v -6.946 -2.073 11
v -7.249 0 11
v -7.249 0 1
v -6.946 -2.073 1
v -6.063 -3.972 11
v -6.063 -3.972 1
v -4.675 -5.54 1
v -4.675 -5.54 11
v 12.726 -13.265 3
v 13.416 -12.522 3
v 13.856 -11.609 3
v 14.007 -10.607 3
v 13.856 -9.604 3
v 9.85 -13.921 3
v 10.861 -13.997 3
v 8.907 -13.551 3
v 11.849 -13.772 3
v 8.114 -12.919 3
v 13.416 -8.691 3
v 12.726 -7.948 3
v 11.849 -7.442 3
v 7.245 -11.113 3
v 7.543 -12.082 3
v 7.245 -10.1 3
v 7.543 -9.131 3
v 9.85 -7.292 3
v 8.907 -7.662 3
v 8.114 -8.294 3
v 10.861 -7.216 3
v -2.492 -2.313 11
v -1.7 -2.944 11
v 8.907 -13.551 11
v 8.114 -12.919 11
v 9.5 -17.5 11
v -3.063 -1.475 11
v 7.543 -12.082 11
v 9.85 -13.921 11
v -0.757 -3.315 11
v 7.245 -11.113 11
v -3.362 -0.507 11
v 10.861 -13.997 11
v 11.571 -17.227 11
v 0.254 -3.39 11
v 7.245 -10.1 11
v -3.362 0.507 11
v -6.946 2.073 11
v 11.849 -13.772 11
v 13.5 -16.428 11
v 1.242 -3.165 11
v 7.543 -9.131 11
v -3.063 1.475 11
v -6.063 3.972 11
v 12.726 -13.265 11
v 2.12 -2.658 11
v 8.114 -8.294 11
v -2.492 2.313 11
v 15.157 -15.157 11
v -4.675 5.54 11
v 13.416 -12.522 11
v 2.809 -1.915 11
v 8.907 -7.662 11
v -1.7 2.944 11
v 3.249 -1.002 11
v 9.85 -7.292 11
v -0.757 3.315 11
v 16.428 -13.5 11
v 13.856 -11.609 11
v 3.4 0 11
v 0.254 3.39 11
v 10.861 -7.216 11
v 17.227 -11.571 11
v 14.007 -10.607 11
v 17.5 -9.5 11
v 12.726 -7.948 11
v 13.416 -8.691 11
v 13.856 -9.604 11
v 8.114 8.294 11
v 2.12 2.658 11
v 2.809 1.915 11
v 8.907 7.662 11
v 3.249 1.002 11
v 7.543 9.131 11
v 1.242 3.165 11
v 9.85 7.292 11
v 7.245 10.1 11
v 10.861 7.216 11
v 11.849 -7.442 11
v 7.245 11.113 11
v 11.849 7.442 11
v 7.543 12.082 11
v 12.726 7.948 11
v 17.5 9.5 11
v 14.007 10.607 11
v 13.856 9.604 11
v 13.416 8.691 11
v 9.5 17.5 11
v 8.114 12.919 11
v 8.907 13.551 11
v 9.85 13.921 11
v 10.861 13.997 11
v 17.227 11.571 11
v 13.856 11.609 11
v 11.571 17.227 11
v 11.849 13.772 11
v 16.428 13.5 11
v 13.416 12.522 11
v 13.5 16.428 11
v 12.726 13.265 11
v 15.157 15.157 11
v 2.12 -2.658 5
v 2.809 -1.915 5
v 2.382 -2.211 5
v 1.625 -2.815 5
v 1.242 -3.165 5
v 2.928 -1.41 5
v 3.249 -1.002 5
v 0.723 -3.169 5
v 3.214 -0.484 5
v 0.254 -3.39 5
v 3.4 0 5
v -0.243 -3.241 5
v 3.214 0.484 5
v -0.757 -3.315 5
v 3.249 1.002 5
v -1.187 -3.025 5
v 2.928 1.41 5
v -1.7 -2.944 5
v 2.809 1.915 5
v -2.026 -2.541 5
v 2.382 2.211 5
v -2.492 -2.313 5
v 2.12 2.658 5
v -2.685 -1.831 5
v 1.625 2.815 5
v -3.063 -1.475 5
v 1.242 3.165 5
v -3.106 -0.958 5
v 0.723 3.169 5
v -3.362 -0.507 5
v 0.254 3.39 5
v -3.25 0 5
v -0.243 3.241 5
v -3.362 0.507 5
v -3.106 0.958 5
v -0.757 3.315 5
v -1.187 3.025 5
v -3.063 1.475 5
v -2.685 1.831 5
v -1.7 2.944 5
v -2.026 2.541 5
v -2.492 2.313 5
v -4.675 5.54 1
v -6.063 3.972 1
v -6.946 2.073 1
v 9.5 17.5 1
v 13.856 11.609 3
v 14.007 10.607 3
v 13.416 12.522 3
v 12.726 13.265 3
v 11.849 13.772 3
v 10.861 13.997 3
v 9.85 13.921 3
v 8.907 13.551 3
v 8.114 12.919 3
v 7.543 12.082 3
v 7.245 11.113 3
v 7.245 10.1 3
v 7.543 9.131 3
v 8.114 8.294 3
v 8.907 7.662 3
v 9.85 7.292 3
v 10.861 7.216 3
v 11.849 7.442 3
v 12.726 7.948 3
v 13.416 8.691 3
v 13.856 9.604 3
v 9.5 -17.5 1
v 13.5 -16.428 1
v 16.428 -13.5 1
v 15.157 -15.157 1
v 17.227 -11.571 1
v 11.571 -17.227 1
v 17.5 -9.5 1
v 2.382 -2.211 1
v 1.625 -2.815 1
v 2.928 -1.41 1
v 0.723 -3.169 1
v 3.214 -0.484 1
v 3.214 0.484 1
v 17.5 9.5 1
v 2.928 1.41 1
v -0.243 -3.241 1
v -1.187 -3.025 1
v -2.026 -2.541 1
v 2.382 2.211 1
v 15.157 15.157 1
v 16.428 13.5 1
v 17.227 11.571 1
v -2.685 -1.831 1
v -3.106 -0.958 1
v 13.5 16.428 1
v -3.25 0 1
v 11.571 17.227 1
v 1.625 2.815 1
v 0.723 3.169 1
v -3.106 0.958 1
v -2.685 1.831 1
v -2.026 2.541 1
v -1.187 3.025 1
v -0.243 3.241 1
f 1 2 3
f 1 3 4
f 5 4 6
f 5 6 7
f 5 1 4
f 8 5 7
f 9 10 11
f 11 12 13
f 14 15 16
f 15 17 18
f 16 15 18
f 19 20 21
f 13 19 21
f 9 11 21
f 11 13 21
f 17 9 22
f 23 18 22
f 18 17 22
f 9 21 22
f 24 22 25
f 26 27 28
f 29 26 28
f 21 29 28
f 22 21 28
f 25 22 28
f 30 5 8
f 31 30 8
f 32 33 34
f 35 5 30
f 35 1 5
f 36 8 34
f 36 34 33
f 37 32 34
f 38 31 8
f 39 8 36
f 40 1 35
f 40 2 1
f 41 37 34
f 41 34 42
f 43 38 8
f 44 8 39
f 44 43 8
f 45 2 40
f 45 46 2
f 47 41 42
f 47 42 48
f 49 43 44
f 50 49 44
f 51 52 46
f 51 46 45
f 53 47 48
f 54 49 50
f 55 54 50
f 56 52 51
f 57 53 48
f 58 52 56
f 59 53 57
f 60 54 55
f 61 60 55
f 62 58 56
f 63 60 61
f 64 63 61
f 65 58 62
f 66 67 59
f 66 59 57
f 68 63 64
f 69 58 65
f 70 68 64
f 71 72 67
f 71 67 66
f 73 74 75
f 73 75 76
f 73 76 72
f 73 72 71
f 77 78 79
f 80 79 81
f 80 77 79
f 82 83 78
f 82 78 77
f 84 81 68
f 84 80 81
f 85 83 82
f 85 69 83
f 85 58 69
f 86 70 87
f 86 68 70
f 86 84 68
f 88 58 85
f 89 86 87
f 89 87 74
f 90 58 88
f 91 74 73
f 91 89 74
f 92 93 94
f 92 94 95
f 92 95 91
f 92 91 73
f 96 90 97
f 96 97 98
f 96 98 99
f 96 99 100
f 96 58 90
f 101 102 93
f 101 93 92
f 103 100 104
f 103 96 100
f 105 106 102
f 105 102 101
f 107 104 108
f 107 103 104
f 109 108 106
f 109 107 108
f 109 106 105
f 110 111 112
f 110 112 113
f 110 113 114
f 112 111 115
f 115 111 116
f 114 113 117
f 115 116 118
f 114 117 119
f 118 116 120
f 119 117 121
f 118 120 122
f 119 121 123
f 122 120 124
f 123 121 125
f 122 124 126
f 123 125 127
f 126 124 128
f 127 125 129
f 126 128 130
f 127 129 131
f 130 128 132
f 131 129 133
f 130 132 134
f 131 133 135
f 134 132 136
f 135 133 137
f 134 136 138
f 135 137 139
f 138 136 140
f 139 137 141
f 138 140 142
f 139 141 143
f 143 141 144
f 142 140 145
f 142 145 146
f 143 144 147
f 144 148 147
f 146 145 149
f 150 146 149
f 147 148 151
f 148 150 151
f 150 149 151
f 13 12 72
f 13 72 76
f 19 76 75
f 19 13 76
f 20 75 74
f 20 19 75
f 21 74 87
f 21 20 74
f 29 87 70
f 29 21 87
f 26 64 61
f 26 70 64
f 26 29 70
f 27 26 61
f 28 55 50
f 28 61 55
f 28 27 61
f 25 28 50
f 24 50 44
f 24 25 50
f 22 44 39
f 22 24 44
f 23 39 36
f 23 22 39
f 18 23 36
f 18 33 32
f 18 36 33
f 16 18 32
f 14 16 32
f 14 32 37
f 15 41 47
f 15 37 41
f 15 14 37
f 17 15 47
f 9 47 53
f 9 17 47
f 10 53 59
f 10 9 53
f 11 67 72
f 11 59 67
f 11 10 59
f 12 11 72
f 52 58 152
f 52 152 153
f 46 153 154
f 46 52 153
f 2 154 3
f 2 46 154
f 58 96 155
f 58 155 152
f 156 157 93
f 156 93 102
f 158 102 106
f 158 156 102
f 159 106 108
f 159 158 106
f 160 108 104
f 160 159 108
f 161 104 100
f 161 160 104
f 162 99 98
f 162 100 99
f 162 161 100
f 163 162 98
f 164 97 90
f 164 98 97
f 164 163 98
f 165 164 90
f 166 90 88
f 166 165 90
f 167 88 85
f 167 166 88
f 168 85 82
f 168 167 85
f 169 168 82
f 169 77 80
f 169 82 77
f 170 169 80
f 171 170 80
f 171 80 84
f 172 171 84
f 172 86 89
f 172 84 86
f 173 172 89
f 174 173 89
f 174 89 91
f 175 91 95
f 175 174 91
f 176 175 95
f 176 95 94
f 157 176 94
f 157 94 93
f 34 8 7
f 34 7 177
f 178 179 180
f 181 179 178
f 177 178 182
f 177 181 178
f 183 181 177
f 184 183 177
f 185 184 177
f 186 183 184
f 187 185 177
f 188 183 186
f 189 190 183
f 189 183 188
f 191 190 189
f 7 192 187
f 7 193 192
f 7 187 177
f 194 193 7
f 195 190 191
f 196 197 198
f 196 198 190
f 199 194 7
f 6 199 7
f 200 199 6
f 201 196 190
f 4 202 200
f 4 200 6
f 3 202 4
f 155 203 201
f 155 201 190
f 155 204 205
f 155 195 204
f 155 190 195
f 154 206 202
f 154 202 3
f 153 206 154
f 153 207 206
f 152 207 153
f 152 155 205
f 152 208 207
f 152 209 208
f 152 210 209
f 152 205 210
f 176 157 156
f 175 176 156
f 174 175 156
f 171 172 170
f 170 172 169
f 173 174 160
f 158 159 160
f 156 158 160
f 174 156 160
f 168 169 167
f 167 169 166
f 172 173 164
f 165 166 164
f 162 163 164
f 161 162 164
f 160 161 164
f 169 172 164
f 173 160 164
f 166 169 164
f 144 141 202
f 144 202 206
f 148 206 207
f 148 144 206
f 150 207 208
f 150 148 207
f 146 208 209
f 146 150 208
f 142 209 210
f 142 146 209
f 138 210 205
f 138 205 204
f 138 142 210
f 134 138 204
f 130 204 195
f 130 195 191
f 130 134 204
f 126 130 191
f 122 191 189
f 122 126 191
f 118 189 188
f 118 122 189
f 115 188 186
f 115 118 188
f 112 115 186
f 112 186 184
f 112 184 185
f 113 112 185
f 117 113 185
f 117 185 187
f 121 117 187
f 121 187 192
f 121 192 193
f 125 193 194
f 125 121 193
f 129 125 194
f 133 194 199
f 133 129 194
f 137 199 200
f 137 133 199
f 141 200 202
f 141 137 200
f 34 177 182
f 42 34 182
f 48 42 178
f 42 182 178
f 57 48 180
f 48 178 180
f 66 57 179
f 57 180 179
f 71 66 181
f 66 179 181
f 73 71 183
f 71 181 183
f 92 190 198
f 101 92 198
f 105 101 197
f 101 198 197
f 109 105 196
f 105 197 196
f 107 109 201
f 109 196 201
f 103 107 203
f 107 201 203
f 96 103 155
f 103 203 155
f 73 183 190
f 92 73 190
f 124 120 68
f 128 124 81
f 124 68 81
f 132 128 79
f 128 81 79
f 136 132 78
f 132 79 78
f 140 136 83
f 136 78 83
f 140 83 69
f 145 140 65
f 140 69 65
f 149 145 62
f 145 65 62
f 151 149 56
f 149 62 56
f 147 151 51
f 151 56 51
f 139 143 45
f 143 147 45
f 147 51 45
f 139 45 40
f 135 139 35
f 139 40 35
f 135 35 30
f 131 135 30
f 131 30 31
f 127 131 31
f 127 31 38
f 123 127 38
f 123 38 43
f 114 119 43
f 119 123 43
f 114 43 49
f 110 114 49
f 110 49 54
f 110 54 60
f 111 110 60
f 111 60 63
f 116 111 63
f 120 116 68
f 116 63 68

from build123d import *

# Parameters (mm, degrees)
SKETCH_1_R          = 3.4
EXTRUDE_1_DEPTH     = 11
SKETCH_2_R          = 3.4
EXTRUDE_2_DEPTH     = 3
SKETCH_3_R          = 3.4
CUT_EXTRUDE_1_DEPTH = 28.083205128
CUT_EXTRUDE_START   = -5
SKETCH_4_R          = 6
SKETCH_4_R_2        = 3.4
CUT_EXTRUDE_2_DEPTH = 5
CUT_EXTRUDE_3_DEPTH = 28.083205128
CUT_EXTRUDE_5_DEPTH = 28.083205128
SKETCH_8_R          = 3.4
EXTRUDE_3_DEPTH     = 1
CUT_EXTRUDE_START_2 = -1
CUT_EXTRUDE_6_DEPTH = 1
CUT_EXTRUDE_7_DEPTH = 1
CUT_EXTRUDE_START_3 = -10
CUT_EXTRUDE_8_DEPTH = 10
EXTRUDE_START       = -4
SKETCH_12_R         = 6
SKETCH_12_R_2       = 3.25
EXTRUDE_5_DEPTH     = 4


with BuildPart() as part:
    # 草图1 → 凸台-拉伸1 (new body)
    with BuildSketch(Plane.XY):
        with BuildLine():
            Line((-9.5, -17.5), (9.5, -17.5))
            ThreePointArc((9.5, -17.5), (15.156854249, -15.156854249), (17.5, -9.5))
            Line((17.5, -9.5), (17.5, 9.5))
            ThreePointArc((17.5, 9.5), (15.156854249, 15.156854249), (9.5, 17.5))
            Line((9.5, 17.5), (-9.5, 17.5))
            ThreePointArc((-9.5, 17.5), (-15.156854249, 15.156854249), (-17.5, 9.5))
            Line((-17.5, 9.5), (-17.5, -9.5))
            ThreePointArc((-17.5, -9.5), (-15.156854249, -15.156854249), (-9.5, -17.5))
        make_face()
        with Locations((10.606601718, 10.606601718)):
            Circle(SKETCH_1_R, mode=Mode.SUBTRACT)
        with Locations((10.606601718, -10.606601718)):
            Circle(SKETCH_1_R, mode=Mode.SUBTRACT)
        with Locations((-10.606601718, -10.606601718)):
            Circle(SKETCH_1_R, mode=Mode.SUBTRACT)
        with Locations((-10.606601718, 10.606601718)):
            Circle(SKETCH_1_R, mode=Mode.SUBTRACT)
    extrude(amount=EXTRUDE_1_DEPTH)

    # 草图2 → 凸台-拉伸2 (add)
    with BuildSketch(Plane(origin=(0, 0, 0), x_dir=(-1, 0, 0), z_dir=(0, 0, -1))):
        with Locations((10.606601718, -10.606601718)):
            Circle(SKETCH_2_R)
        with Locations((-10.606601718, -10.606601718)):
            Circle(SKETCH_2_R)
        with Locations((10.606601718, 10.606601718)):
            Circle(SKETCH_2_R)
        with Locations((-10.606601718, 10.606601718)):
            Circle(SKETCH_2_R)
    extrude(amount=-EXTRUDE_2_DEPTH)

    # 草图3 → 切除-拉伸1 (cut, through all)
    with BuildSketch(Plane.XY.offset(11)):
        Circle(SKETCH_3_R)
    extrude(amount=-CUT_EXTRUDE_1_DEPTH, mode=Mode.SUBTRACT)

    # 草图4 → 切除-拉伸2 (cut)
    with BuildSketch(Plane(origin=(0, 0, 0), x_dir=(-1, 0, 0), z_dir=(0, 0, -1)).offset(CUT_EXTRUDE_START)):
        Circle(SKETCH_4_R)
        with Locations(Location((0, 0, 0), (0, 0, 180))):
            Circle(SKETCH_4_R_2, mode=Mode.SUBTRACT)
    extrude(amount=CUT_EXTRUDE_2_DEPTH, mode=Mode.SUBTRACT)

    # 草图6 → 切除-拉伸3 (cut, through all)
    with BuildSketch(Plane(origin=(0, 0, 0), x_dir=(-1, 0, 0), z_dir=(0, 0, -1))):
        with BuildLine():
            Line((9.5, 17.5), (0, 17.5))
            Line((0, 17.5), (17.5, 0))
            Line((17.5, 0), (17.5, 9.5))
            ThreePointArc((17.5, 9.5), (15.156854249, 15.156854249), (9.5, 17.5))
        make_face()
        with BuildLine():
            Line((17.5, -9.5), (17.5, 0))
            Line((17.5, 0), (0, -17.5))
            Line((0, -17.5), (9.5, -17.5))
            ThreePointArc((9.5, -17.5), (15.156854249, -15.156854249), (17.5, -9.5))
        make_face()
    extrude(amount=-CUT_EXTRUDE_3_DEPTH, mode=Mode.SUBTRACT)

    # 草图7 → 切除-拉伸5 (cut, through all)
    with BuildSketch(Plane.XY.offset(11)):
        with BuildLine():
            Line((-7.222574041, -10.277425959), (0, -17.5))
            ThreePointArc((0, -17.5), (-7.248737342, 0), (0, 17.5))
            Line((0, 17.5), (-7.222574041, 10.277425959))
            ThreePointArc((-7.222574041, 10.277425959), (-8.202438662, 8.202438662), (-10.277425959, 7.222574041))
            Line((-10.277425959, 7.222574041), (-17.5, 0))
            Line((-17.5, 0), (-10.277425959, -7.222574041))
            ThreePointArc((-10.277425959, -7.222574041), (-8.202438662, -8.202438662), (-7.222574041, -10.277425959))
        make_face()
        with BuildLine():
            Line((-10.277425959, -7.222574041), (-7.222574041, -10.277425959))
            ThreePointArc((-7.222574041, -10.277425959), (-8.202438662, -8.202438662), (-10.277425959, -7.222574041))
        make_face()
        with BuildLine():
            ThreePointArc((-10.277425959, 7.222574041), (-8.202438662, 8.202438662), (-7.222574041, 10.277425959))
            Line((-7.222574041, 10.277425959), (-10.277425959, 7.222574041))
        make_face()
    extrude(amount=-CUT_EXTRUDE_5_DEPTH, mode=Mode.SUBTRACT)

    # 草图8 → 凸台-拉伸3 (add)
    with BuildSketch(Plane.XY.offset(11)):
        with BuildLine():
            Line((9.5, 17.5), (0, 17.5))
            ThreePointArc((0, 17.5), (-7.248737342, 0), (0, -17.5))
            Line((0, -17.5), (9.5, -17.5))
            ThreePointArc((9.5, -17.5), (15.156854249, -15.156854249), (17.5, -9.5))
            Line((17.5, -9.5), (17.5, 9.5))
            ThreePointArc((17.5, 9.5), (15.156854249, 15.156854249), (9.5, 17.5))
        make_face()
        Circle(SKETCH_8_R, mode=Mode.SUBTRACT)
        with Locations(Location((10.606601718, 10.606601718, 0), (0, 0, 180))):
            Circle(SKETCH_8_R, mode=Mode.SUBTRACT)
        with Locations(Location((10.606601718, -10.606601718, 0), (0, 0, 180))):
            Circle(SKETCH_8_R, mode=Mode.SUBTRACT)
    extrude(amount=EXTRUDE_3_DEPTH)

    # 草图9 → 切除-拉伸6 (cut)
    with BuildSketch(Plane.XY.offset(12).offset(CUT_EXTRUDE_START_2)):
        with BuildLine():
            Line((9.5, 17.5), (0, 17.5))
            ThreePointArc((0, 17.5), (-7.248737342, 0), (0, -17.5))
            Line((0, -17.5), (9.5, -17.5))
            ThreePointArc((9.5, -17.5), (15.156854249, -15.156854249), (17.5, -9.5))
            Line((17.5, -9.5), (17.5, 9.5))
            ThreePointArc((17.5, 9.5), (15.156854249, 15.156854249), (9.5, 17.5))
        make_face()
    extrude(amount=CUT_EXTRUDE_6_DEPTH, mode=Mode.SUBTRACT)

    # 草图10 → 切除-拉伸7 (cut)
    with BuildSketch(Plane(origin=(0, 0, 0), x_dir=(-1, 0, 0), z_dir=(0, 0, -1))):
        with BuildLine():
            Line((0, 17.5), (-9.5, 17.5))
            ThreePointArc((-9.5, 17.5), (-15.156854249, 15.156854249), (-17.5, 9.5))
            Line((-17.5, 9.5), (-17.5, -9.5))
            ThreePointArc((-17.5, -9.5), (-15.156854249, -15.156854249), (-9.5, -17.5))
            Line((-9.5, -17.5), (0, -17.5))
            ThreePointArc((0, -17.5), (7.248737342, 0), (0, 17.5))
        make_face()
    extrude(amount=-CUT_EXTRUDE_7_DEPTH, mode=Mode.SUBTRACT)

    # 草图11 → 切除-拉伸8 (cut)
    with BuildSketch(Plane(origin=(0, 0, 1), x_dir=(-1, 0, 0), z_dir=(0, 0, -1)).offset(CUT_EXTRUDE_START_3)):
        with BuildLine():
            Line((0, 17.5), (-9.5, 17.5))
            Line((-9.5, 17.5), (4.674526852, 5.540125608))
            ThreePointArc((4.674526852, 5.540125608), (6.573758833, 3.054486512), (7.248737342, 0))
            ThreePointArc((7.248737342, 0), (5.364851885, 9.470931753), (0, 17.5))
        make_face()
        with BuildLine():
            ThreePointArc((0, -17.5), (5.364851885, -9.470931753), (7.248737342, 0))
            ThreePointArc((7.248737342, 0), (6.573758833, -3.054486512), (4.674526852, -5.540125608))
            Line((4.674526852, -5.540125608), (-9.5, -17.5))
            Line((-9.5, -17.5), (0, -17.5))
        make_face()
    extrude(amount=CUT_EXTRUDE_8_DEPTH, mode=Mode.SUBTRACT)

    # 草图12 → 凸台-拉伸5 (add)
    with BuildSketch(Plane(origin=(0, 0, 1), x_dir=(-1, 0, 0), z_dir=(0, 0, -1)).offset(EXTRUDE_START)):
        Circle(SKETCH_12_R)
        Circle(SKETCH_12_R_2, mode=Mode.SUBTRACT)
    extrude(amount=EXTRUDE_5_DEPTH)


solid = part.part
